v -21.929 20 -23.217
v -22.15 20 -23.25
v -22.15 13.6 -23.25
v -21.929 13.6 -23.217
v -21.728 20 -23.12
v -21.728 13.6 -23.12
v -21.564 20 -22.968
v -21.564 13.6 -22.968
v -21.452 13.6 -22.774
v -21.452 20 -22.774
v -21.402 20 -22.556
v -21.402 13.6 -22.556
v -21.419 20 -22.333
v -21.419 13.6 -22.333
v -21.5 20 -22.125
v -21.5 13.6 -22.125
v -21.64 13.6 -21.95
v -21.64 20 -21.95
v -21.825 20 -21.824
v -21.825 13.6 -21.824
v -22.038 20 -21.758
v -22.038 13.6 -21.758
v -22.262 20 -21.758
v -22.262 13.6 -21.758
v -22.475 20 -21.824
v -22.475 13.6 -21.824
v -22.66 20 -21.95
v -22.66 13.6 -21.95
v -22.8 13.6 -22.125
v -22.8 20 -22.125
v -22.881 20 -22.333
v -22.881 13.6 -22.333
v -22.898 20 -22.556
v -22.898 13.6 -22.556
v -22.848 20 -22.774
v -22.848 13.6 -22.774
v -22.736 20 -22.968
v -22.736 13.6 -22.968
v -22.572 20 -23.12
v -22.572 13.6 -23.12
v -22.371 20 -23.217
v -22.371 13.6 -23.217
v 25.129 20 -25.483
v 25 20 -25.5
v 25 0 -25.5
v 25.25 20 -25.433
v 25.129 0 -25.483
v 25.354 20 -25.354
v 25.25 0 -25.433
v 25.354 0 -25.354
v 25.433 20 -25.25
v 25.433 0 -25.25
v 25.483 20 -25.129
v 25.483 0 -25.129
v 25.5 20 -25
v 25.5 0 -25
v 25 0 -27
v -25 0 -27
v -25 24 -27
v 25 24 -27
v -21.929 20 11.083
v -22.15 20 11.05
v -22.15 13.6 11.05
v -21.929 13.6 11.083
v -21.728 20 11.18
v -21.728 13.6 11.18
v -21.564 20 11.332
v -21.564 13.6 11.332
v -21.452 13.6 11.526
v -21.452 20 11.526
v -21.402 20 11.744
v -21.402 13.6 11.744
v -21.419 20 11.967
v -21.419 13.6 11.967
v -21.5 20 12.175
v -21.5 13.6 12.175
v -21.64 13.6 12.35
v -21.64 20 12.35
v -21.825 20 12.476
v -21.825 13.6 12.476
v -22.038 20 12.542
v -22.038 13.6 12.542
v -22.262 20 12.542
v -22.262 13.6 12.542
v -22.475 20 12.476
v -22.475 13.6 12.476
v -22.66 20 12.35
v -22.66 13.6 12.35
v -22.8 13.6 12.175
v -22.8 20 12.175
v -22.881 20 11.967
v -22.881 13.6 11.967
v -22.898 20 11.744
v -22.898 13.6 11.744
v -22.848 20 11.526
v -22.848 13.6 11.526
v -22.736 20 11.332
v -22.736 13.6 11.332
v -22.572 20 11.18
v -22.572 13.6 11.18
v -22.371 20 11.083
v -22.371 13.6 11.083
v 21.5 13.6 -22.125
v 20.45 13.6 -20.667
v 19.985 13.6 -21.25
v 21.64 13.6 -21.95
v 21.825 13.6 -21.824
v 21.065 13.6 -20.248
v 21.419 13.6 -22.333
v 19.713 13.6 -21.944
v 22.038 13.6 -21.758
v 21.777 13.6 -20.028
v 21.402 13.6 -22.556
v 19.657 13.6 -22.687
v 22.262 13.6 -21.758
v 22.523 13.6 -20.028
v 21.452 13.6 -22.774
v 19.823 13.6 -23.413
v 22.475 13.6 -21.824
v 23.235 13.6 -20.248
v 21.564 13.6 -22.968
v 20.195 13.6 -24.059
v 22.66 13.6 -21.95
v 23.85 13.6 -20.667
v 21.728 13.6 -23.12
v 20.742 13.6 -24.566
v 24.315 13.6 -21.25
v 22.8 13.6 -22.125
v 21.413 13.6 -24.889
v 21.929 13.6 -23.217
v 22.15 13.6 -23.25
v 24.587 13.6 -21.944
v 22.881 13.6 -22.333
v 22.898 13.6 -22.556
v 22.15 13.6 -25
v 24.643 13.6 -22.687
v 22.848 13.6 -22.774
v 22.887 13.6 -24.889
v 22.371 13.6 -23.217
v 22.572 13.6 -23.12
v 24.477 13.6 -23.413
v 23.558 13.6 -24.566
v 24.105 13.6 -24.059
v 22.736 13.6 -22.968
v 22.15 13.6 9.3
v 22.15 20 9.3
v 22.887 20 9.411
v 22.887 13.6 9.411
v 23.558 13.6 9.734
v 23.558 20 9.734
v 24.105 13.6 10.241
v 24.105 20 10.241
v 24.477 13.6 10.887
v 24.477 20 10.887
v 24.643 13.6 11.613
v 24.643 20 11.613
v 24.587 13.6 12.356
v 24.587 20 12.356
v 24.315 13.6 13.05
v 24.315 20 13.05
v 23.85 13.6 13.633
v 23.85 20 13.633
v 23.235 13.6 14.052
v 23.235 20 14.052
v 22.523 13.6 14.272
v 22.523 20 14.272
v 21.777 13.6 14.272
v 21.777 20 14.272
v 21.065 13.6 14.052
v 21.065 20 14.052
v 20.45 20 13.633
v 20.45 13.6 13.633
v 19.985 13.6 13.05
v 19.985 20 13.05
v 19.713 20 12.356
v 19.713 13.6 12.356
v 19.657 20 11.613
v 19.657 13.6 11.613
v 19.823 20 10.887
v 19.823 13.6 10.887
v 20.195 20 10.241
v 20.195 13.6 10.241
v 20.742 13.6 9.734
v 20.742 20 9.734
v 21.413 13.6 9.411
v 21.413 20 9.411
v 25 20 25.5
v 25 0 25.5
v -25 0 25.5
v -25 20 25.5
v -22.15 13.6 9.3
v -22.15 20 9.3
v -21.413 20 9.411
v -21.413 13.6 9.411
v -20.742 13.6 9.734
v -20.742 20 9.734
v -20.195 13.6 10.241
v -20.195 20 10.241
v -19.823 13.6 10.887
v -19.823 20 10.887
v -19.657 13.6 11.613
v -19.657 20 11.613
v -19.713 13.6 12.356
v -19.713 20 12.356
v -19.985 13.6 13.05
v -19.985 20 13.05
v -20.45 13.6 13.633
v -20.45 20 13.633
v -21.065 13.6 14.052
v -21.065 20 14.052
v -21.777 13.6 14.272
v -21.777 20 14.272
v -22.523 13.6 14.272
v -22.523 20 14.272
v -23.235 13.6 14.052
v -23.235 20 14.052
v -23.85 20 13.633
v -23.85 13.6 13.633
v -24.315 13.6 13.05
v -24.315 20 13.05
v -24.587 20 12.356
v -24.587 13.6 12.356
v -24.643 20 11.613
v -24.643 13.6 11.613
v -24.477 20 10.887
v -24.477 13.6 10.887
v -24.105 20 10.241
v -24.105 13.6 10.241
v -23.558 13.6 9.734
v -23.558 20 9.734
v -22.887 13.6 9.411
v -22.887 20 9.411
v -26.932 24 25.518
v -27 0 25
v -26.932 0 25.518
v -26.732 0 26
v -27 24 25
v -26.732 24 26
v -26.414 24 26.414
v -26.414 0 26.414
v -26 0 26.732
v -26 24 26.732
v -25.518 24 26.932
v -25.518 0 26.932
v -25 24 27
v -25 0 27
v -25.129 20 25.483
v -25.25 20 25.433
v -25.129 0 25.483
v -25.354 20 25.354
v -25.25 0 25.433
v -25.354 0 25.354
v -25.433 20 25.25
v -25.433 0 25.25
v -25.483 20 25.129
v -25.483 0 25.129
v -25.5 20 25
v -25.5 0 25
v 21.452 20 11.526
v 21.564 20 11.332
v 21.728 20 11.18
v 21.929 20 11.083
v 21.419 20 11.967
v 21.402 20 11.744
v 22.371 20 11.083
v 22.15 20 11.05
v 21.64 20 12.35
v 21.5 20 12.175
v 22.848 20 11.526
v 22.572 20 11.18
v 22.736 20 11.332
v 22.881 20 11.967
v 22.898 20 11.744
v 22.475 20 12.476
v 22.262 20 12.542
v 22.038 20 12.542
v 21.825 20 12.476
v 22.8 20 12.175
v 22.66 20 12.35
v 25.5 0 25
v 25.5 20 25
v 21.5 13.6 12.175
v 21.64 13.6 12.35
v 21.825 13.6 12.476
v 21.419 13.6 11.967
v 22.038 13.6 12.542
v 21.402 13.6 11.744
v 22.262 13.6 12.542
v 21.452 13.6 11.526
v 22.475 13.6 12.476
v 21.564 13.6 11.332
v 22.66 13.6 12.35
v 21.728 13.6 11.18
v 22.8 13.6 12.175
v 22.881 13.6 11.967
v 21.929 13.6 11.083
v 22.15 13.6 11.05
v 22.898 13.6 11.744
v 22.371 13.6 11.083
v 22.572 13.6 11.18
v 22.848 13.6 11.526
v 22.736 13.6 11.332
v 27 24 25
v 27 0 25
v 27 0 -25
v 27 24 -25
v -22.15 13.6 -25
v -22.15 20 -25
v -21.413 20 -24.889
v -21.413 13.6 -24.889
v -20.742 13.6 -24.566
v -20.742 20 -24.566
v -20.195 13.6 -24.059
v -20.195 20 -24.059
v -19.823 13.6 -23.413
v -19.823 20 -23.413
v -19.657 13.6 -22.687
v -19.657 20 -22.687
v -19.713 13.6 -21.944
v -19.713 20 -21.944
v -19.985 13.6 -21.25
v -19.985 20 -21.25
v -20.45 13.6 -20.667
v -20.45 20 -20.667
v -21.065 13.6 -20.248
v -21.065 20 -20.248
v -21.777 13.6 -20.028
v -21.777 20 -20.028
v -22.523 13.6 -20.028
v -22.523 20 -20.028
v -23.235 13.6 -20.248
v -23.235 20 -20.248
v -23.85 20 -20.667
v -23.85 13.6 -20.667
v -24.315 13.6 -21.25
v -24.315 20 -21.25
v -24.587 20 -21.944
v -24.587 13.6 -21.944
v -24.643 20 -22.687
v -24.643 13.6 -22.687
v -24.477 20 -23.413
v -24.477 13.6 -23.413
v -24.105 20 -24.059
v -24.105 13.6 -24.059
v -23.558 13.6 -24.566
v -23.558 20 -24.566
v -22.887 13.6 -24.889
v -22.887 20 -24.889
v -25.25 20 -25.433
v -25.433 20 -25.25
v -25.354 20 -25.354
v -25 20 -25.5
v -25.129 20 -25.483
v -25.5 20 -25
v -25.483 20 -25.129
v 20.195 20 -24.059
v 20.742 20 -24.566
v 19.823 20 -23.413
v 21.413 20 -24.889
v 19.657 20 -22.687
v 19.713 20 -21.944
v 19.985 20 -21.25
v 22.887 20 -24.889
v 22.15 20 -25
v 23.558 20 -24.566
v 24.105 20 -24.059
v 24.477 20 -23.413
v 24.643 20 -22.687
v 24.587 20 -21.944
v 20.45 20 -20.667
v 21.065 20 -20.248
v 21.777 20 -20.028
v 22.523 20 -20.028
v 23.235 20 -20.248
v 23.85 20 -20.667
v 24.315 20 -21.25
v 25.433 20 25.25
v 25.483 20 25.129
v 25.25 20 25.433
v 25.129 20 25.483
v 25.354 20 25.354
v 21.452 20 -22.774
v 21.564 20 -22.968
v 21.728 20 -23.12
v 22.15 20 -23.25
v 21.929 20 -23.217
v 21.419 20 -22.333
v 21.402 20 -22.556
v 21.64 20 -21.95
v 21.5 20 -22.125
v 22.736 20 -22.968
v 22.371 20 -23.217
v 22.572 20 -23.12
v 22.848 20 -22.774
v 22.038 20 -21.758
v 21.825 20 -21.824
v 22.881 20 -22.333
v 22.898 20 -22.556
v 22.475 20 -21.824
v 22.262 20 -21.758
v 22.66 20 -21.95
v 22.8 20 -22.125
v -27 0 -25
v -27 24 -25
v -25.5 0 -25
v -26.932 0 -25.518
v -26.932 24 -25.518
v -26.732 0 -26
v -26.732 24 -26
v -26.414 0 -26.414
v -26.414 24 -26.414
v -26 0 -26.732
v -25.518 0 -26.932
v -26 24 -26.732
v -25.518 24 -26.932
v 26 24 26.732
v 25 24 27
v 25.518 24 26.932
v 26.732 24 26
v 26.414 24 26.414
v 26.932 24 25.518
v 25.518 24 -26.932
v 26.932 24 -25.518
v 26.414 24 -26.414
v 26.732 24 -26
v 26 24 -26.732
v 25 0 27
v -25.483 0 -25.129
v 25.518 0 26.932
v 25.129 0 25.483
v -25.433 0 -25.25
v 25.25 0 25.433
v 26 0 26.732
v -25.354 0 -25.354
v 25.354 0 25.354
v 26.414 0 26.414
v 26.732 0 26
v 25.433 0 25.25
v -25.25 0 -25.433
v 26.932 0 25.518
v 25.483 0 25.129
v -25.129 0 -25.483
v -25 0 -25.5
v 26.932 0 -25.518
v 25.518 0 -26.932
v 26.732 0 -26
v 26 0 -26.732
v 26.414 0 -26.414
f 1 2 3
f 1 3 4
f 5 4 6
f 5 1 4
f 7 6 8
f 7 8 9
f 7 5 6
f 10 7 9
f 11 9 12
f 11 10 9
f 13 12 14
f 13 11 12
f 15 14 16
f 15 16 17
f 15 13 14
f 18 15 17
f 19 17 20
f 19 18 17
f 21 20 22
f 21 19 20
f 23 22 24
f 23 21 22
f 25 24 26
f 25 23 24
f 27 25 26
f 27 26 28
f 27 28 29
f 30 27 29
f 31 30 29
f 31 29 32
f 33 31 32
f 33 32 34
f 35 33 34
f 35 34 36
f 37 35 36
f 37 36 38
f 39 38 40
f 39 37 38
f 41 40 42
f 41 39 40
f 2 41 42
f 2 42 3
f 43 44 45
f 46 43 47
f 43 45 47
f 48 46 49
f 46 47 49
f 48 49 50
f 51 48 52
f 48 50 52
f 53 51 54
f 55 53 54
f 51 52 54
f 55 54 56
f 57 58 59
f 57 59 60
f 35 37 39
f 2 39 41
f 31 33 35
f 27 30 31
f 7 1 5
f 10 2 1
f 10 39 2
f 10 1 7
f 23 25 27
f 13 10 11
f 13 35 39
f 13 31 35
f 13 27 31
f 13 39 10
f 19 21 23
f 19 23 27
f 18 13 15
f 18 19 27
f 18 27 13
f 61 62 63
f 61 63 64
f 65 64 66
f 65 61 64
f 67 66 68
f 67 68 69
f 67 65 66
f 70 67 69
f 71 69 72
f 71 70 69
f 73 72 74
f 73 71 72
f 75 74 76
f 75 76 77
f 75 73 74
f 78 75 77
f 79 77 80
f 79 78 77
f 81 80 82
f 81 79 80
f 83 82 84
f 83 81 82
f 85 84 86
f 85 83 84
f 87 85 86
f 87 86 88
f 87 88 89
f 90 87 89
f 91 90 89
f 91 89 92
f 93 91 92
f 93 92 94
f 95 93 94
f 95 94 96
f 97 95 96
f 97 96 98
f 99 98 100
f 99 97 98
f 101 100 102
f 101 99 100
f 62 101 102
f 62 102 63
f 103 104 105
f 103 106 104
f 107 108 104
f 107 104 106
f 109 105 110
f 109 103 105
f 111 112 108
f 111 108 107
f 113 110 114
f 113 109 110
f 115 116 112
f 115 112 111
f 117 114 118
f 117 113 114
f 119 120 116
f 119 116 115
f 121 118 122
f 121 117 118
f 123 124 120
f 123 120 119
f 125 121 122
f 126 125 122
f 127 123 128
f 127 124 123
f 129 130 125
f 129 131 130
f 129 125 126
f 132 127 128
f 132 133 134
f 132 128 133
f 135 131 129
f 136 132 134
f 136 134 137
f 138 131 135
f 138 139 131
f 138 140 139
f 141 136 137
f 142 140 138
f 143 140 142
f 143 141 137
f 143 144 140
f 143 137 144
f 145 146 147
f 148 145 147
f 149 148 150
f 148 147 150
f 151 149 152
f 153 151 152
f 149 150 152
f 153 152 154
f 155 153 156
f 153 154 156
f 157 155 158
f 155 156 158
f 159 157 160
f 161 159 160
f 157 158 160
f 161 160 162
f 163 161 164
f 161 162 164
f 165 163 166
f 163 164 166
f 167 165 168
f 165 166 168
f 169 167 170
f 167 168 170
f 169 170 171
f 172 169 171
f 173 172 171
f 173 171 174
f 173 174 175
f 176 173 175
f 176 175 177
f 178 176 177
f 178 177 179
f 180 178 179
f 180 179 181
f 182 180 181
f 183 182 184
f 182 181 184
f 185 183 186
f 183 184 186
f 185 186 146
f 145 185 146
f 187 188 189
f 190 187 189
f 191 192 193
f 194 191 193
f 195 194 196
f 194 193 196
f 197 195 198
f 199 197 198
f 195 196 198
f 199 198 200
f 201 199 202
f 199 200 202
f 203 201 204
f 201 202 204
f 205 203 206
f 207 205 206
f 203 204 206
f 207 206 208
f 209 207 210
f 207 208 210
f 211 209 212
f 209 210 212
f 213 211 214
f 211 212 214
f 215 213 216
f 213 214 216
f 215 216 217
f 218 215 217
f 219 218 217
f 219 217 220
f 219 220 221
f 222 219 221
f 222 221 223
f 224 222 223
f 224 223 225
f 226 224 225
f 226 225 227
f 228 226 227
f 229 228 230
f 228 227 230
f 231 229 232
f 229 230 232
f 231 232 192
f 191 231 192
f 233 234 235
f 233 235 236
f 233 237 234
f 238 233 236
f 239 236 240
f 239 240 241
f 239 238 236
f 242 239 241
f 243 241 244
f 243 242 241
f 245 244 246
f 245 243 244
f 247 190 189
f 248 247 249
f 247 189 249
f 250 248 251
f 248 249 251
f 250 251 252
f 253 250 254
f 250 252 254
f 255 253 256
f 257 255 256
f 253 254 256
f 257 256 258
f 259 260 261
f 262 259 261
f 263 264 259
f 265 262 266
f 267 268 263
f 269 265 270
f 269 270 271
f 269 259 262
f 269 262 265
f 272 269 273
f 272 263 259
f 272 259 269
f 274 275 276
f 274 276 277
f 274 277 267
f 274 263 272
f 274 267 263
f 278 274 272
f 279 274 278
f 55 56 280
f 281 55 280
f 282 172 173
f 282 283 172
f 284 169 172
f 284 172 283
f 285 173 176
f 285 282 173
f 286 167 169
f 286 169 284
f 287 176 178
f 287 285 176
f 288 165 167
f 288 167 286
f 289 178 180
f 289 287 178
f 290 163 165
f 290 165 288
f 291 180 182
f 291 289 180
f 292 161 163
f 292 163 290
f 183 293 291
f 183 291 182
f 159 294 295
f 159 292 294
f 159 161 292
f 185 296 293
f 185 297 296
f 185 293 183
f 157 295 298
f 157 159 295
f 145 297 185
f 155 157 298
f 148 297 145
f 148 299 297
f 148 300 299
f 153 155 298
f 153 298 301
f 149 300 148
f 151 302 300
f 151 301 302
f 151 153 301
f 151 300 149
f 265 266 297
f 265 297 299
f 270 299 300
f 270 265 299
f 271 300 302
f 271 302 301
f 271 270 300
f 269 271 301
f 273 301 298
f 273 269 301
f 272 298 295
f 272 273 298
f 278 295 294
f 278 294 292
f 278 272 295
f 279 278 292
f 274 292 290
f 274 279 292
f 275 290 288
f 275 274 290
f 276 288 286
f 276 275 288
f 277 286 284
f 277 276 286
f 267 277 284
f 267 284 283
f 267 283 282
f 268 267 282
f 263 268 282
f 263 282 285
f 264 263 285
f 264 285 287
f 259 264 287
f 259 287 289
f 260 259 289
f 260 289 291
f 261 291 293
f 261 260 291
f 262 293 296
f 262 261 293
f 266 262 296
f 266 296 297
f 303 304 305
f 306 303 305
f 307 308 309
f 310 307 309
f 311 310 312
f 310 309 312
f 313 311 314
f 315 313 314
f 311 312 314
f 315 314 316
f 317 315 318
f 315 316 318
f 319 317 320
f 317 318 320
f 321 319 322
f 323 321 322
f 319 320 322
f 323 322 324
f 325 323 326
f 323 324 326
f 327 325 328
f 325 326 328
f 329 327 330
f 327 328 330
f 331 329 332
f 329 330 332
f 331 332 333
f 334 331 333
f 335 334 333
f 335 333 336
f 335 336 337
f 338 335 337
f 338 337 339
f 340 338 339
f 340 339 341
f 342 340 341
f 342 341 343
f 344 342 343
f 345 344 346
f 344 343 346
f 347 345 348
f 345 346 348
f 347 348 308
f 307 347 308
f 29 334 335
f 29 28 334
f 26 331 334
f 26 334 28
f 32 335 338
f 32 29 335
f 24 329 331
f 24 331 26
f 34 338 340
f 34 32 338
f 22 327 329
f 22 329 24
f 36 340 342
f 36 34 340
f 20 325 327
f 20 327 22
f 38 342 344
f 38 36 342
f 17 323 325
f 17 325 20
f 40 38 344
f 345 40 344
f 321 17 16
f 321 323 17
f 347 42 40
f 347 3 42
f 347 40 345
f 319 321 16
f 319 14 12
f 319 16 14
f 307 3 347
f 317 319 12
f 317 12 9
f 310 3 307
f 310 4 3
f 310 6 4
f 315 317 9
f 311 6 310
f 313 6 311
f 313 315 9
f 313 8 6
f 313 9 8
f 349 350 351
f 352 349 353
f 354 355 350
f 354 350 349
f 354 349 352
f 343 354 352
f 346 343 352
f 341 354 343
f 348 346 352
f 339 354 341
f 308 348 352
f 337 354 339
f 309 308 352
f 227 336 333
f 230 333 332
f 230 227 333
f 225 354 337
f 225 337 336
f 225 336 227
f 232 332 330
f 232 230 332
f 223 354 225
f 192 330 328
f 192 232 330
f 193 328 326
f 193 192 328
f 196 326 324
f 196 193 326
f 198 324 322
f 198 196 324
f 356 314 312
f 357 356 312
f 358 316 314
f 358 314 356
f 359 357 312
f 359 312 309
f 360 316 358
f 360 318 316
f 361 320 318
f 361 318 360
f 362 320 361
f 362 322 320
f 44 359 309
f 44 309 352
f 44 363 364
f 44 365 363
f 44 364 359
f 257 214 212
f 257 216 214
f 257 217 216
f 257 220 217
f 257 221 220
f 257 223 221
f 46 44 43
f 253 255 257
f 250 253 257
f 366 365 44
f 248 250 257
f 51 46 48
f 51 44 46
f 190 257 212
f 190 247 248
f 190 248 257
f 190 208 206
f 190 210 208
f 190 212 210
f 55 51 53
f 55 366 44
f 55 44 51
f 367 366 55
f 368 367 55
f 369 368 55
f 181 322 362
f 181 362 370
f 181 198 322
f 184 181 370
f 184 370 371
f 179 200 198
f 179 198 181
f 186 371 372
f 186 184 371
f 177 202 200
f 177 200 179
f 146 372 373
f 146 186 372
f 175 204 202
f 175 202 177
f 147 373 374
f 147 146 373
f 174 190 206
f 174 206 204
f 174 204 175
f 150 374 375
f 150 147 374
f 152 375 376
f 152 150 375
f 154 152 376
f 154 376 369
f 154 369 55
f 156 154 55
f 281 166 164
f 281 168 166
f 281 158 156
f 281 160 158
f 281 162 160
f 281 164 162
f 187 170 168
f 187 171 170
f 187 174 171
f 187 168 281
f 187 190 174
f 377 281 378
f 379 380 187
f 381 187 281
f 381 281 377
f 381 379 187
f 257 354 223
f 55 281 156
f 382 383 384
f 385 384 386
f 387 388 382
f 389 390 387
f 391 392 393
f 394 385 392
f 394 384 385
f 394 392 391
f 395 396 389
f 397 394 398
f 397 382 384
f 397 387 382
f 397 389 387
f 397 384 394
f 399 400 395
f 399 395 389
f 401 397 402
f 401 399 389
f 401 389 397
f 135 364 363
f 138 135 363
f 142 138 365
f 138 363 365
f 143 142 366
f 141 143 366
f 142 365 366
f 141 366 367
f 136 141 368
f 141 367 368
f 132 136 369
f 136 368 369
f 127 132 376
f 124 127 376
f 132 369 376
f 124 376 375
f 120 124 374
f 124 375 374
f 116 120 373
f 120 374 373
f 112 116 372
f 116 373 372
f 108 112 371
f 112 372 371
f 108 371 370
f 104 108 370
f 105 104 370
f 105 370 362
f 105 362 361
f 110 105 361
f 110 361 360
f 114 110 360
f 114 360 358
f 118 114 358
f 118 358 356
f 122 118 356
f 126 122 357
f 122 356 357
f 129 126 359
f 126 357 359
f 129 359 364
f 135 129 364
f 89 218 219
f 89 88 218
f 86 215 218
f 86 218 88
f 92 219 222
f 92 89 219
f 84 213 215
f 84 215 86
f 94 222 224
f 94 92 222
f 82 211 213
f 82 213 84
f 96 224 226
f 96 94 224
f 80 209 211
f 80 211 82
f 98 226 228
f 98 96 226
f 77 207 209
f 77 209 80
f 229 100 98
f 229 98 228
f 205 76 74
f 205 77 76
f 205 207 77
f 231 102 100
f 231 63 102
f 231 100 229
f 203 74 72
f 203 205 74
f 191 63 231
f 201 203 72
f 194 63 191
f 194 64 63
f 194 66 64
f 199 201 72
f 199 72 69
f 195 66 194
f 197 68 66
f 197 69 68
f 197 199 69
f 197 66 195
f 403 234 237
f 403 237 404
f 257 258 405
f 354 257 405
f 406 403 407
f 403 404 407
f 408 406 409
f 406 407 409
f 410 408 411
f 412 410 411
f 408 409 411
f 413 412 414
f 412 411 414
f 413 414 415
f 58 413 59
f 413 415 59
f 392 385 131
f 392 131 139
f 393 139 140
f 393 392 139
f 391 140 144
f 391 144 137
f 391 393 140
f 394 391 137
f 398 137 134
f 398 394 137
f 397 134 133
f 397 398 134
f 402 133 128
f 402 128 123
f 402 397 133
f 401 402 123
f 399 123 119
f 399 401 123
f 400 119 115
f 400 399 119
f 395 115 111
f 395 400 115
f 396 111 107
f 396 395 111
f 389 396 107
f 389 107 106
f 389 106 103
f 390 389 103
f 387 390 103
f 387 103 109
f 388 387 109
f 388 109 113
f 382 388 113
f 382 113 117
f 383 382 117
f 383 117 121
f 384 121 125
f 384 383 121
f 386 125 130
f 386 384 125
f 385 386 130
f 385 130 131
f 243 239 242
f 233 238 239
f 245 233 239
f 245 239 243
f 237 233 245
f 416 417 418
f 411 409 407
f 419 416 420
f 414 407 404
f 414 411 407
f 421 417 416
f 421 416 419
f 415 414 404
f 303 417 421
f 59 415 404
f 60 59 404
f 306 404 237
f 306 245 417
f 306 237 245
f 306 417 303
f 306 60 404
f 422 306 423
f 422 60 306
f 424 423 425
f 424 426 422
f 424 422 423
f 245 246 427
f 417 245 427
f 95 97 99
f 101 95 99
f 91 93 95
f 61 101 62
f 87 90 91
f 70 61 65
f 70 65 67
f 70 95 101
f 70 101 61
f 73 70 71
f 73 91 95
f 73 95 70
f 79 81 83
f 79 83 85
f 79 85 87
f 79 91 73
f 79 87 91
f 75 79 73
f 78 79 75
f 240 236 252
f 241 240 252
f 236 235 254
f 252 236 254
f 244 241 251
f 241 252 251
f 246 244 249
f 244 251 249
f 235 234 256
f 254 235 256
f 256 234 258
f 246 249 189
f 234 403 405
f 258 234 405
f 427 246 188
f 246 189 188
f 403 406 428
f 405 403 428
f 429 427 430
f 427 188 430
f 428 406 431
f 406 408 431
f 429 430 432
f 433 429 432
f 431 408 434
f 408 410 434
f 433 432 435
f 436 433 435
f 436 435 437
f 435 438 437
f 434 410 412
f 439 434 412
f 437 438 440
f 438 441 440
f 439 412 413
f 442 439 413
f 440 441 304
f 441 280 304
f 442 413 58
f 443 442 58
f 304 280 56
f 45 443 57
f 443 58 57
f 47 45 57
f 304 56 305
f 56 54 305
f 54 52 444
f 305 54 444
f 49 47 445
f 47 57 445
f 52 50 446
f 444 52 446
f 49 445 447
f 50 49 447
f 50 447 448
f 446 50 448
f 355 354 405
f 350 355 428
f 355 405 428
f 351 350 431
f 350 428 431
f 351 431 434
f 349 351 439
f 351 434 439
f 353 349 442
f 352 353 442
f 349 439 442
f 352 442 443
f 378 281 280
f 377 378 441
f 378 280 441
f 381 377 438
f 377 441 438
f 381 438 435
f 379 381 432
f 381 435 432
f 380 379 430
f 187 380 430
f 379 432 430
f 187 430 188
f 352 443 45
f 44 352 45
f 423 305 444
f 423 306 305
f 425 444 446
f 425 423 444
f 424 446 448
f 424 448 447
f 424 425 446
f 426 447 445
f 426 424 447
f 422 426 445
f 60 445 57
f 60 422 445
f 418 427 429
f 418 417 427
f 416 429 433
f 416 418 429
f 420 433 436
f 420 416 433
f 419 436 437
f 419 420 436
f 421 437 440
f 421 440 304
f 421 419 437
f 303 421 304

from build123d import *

# Parameters (mm, degrees)
SKETCH_1_W          = 54
SKETCH_1_H          = 54
EXTRUDE_1_DEPTH     = 24
FILLET_1_R          = 2
FILLET_2_R          = 2
FILLET_3_R          = 2
FILLET_4_R          = 2
CUT_EXTRUDE_1_DEPTH = 20
SKETCH_9_R          = 2.5
SKETCH_9_R_2        = 0.75
EXTRUDE_4_DEPTH     = 6.4


with BuildPart() as part:
    # 草图1 → 凸台-拉伸1 (new body)
    with BuildSketch(Plane(origin=(0, 0, 0), x_dir=(1, 0, 0), z_dir=(0, 1, 0))):
        Rectangle(SKETCH_1_W, SKETCH_1_H)
    extrude(amount=EXTRUDE_1_DEPTH)

    # 圆角1
    fillet_1_edges = [part.edges().sort_by_distance(p)[0] for p in [
        (-27, 12, 27),
    ]]
    fillet(fillet_1_edges, radius=FILLET_1_R)

    # 圆角2
    fillet_2_edges = [part.edges().sort_by_distance(p)[0] for p in [
        (-27, 12, -27),
    ]]
    fillet(fillet_2_edges, radius=FILLET_2_R)

    # 圆角3
    fillet_3_edges = [part.edges().sort_by_distance(p)[0] for p in [
        (27, 12, 27),
    ]]
    fillet(fillet_3_edges, radius=FILLET_3_R)

    # 圆角4
    fillet_4_edges = [part.edges().sort_by_distance(p)[0] for p in [
        (27, 12, -27),
    ]]
    fillet(fillet_4_edges, radius=FILLET_4_R)

    # 草图6 → 切除-拉伸1 (cut)
    with BuildSketch(Plane.XZ):
        with BuildLine():
            ThreePointArc((-25, 25.5), (-25.353553391, 25.353553391), (-25.5, 25))
            Line((-25.5, 25), (-25.5, -25))
            ThreePointArc((-25.5, -25), (-25.353553391, -25.353553391), (-25, -25.5))
            Line((-25, -25.5), (25, -25.5))
            ThreePointArc((25, -25.5), (25.353553391, -25.353553391), (25.5, -25))
            Line((25.5, -25), (25.5, 25))
            ThreePointArc((25.5, 25), (25.353553391, 25.353553391), (25, 25.5))
            Line((25, 25.5), (-25, 25.5))
        make_face()
    extrude(amount=-CUT_EXTRUDE_1_DEPTH, mode=Mode.SUBTRACT)

    # 草图9 → 凸台-拉伸4 (add)
    # profile 1 of 4: a face of its own
    with BuildSketch(Plane.XZ.offset(-20)):
        with Locations((-22.15, -22.5)):
            Circle(SKETCH_9_R)
        with Locations((-22.15, -22.5)):
            Circle(SKETCH_9_R_2, mode=Mode.SUBTRACT)
    # profile 2 of 4: a face of its own
    with BuildSketch(Plane.XZ.offset(-20)):
        with Locations((22.15, -22.5)):
            Circle(SKETCH_9_R)
        with Locations((22.15, -22.5)):
            Circle(SKETCH_9_R_2, mode=Mode.SUBTRACT)
    # profile 3 of 4: a face of its own
    with BuildSketch(Plane.XZ.offset(-20)):
        with Locations((22.15, 11.8)):
            Circle(SKETCH_9_R)
        with Locations((22.15, 11.8)):
            Circle(SKETCH_9_R_2, mode=Mode.SUBTRACT)
    # profile 4 of 4: a face of its own
    with BuildSketch(Plane.XZ.offset(-20)):
        with Locations((-22.15, 11.8)):
            Circle(SKETCH_9_R)
        with Locations((-22.15, 11.8)):
            Circle(SKETCH_9_R_2, mode=Mode.SUBTRACT)
    extrude(amount=EXTRUDE_4_DEPTH)


solid = part.part
